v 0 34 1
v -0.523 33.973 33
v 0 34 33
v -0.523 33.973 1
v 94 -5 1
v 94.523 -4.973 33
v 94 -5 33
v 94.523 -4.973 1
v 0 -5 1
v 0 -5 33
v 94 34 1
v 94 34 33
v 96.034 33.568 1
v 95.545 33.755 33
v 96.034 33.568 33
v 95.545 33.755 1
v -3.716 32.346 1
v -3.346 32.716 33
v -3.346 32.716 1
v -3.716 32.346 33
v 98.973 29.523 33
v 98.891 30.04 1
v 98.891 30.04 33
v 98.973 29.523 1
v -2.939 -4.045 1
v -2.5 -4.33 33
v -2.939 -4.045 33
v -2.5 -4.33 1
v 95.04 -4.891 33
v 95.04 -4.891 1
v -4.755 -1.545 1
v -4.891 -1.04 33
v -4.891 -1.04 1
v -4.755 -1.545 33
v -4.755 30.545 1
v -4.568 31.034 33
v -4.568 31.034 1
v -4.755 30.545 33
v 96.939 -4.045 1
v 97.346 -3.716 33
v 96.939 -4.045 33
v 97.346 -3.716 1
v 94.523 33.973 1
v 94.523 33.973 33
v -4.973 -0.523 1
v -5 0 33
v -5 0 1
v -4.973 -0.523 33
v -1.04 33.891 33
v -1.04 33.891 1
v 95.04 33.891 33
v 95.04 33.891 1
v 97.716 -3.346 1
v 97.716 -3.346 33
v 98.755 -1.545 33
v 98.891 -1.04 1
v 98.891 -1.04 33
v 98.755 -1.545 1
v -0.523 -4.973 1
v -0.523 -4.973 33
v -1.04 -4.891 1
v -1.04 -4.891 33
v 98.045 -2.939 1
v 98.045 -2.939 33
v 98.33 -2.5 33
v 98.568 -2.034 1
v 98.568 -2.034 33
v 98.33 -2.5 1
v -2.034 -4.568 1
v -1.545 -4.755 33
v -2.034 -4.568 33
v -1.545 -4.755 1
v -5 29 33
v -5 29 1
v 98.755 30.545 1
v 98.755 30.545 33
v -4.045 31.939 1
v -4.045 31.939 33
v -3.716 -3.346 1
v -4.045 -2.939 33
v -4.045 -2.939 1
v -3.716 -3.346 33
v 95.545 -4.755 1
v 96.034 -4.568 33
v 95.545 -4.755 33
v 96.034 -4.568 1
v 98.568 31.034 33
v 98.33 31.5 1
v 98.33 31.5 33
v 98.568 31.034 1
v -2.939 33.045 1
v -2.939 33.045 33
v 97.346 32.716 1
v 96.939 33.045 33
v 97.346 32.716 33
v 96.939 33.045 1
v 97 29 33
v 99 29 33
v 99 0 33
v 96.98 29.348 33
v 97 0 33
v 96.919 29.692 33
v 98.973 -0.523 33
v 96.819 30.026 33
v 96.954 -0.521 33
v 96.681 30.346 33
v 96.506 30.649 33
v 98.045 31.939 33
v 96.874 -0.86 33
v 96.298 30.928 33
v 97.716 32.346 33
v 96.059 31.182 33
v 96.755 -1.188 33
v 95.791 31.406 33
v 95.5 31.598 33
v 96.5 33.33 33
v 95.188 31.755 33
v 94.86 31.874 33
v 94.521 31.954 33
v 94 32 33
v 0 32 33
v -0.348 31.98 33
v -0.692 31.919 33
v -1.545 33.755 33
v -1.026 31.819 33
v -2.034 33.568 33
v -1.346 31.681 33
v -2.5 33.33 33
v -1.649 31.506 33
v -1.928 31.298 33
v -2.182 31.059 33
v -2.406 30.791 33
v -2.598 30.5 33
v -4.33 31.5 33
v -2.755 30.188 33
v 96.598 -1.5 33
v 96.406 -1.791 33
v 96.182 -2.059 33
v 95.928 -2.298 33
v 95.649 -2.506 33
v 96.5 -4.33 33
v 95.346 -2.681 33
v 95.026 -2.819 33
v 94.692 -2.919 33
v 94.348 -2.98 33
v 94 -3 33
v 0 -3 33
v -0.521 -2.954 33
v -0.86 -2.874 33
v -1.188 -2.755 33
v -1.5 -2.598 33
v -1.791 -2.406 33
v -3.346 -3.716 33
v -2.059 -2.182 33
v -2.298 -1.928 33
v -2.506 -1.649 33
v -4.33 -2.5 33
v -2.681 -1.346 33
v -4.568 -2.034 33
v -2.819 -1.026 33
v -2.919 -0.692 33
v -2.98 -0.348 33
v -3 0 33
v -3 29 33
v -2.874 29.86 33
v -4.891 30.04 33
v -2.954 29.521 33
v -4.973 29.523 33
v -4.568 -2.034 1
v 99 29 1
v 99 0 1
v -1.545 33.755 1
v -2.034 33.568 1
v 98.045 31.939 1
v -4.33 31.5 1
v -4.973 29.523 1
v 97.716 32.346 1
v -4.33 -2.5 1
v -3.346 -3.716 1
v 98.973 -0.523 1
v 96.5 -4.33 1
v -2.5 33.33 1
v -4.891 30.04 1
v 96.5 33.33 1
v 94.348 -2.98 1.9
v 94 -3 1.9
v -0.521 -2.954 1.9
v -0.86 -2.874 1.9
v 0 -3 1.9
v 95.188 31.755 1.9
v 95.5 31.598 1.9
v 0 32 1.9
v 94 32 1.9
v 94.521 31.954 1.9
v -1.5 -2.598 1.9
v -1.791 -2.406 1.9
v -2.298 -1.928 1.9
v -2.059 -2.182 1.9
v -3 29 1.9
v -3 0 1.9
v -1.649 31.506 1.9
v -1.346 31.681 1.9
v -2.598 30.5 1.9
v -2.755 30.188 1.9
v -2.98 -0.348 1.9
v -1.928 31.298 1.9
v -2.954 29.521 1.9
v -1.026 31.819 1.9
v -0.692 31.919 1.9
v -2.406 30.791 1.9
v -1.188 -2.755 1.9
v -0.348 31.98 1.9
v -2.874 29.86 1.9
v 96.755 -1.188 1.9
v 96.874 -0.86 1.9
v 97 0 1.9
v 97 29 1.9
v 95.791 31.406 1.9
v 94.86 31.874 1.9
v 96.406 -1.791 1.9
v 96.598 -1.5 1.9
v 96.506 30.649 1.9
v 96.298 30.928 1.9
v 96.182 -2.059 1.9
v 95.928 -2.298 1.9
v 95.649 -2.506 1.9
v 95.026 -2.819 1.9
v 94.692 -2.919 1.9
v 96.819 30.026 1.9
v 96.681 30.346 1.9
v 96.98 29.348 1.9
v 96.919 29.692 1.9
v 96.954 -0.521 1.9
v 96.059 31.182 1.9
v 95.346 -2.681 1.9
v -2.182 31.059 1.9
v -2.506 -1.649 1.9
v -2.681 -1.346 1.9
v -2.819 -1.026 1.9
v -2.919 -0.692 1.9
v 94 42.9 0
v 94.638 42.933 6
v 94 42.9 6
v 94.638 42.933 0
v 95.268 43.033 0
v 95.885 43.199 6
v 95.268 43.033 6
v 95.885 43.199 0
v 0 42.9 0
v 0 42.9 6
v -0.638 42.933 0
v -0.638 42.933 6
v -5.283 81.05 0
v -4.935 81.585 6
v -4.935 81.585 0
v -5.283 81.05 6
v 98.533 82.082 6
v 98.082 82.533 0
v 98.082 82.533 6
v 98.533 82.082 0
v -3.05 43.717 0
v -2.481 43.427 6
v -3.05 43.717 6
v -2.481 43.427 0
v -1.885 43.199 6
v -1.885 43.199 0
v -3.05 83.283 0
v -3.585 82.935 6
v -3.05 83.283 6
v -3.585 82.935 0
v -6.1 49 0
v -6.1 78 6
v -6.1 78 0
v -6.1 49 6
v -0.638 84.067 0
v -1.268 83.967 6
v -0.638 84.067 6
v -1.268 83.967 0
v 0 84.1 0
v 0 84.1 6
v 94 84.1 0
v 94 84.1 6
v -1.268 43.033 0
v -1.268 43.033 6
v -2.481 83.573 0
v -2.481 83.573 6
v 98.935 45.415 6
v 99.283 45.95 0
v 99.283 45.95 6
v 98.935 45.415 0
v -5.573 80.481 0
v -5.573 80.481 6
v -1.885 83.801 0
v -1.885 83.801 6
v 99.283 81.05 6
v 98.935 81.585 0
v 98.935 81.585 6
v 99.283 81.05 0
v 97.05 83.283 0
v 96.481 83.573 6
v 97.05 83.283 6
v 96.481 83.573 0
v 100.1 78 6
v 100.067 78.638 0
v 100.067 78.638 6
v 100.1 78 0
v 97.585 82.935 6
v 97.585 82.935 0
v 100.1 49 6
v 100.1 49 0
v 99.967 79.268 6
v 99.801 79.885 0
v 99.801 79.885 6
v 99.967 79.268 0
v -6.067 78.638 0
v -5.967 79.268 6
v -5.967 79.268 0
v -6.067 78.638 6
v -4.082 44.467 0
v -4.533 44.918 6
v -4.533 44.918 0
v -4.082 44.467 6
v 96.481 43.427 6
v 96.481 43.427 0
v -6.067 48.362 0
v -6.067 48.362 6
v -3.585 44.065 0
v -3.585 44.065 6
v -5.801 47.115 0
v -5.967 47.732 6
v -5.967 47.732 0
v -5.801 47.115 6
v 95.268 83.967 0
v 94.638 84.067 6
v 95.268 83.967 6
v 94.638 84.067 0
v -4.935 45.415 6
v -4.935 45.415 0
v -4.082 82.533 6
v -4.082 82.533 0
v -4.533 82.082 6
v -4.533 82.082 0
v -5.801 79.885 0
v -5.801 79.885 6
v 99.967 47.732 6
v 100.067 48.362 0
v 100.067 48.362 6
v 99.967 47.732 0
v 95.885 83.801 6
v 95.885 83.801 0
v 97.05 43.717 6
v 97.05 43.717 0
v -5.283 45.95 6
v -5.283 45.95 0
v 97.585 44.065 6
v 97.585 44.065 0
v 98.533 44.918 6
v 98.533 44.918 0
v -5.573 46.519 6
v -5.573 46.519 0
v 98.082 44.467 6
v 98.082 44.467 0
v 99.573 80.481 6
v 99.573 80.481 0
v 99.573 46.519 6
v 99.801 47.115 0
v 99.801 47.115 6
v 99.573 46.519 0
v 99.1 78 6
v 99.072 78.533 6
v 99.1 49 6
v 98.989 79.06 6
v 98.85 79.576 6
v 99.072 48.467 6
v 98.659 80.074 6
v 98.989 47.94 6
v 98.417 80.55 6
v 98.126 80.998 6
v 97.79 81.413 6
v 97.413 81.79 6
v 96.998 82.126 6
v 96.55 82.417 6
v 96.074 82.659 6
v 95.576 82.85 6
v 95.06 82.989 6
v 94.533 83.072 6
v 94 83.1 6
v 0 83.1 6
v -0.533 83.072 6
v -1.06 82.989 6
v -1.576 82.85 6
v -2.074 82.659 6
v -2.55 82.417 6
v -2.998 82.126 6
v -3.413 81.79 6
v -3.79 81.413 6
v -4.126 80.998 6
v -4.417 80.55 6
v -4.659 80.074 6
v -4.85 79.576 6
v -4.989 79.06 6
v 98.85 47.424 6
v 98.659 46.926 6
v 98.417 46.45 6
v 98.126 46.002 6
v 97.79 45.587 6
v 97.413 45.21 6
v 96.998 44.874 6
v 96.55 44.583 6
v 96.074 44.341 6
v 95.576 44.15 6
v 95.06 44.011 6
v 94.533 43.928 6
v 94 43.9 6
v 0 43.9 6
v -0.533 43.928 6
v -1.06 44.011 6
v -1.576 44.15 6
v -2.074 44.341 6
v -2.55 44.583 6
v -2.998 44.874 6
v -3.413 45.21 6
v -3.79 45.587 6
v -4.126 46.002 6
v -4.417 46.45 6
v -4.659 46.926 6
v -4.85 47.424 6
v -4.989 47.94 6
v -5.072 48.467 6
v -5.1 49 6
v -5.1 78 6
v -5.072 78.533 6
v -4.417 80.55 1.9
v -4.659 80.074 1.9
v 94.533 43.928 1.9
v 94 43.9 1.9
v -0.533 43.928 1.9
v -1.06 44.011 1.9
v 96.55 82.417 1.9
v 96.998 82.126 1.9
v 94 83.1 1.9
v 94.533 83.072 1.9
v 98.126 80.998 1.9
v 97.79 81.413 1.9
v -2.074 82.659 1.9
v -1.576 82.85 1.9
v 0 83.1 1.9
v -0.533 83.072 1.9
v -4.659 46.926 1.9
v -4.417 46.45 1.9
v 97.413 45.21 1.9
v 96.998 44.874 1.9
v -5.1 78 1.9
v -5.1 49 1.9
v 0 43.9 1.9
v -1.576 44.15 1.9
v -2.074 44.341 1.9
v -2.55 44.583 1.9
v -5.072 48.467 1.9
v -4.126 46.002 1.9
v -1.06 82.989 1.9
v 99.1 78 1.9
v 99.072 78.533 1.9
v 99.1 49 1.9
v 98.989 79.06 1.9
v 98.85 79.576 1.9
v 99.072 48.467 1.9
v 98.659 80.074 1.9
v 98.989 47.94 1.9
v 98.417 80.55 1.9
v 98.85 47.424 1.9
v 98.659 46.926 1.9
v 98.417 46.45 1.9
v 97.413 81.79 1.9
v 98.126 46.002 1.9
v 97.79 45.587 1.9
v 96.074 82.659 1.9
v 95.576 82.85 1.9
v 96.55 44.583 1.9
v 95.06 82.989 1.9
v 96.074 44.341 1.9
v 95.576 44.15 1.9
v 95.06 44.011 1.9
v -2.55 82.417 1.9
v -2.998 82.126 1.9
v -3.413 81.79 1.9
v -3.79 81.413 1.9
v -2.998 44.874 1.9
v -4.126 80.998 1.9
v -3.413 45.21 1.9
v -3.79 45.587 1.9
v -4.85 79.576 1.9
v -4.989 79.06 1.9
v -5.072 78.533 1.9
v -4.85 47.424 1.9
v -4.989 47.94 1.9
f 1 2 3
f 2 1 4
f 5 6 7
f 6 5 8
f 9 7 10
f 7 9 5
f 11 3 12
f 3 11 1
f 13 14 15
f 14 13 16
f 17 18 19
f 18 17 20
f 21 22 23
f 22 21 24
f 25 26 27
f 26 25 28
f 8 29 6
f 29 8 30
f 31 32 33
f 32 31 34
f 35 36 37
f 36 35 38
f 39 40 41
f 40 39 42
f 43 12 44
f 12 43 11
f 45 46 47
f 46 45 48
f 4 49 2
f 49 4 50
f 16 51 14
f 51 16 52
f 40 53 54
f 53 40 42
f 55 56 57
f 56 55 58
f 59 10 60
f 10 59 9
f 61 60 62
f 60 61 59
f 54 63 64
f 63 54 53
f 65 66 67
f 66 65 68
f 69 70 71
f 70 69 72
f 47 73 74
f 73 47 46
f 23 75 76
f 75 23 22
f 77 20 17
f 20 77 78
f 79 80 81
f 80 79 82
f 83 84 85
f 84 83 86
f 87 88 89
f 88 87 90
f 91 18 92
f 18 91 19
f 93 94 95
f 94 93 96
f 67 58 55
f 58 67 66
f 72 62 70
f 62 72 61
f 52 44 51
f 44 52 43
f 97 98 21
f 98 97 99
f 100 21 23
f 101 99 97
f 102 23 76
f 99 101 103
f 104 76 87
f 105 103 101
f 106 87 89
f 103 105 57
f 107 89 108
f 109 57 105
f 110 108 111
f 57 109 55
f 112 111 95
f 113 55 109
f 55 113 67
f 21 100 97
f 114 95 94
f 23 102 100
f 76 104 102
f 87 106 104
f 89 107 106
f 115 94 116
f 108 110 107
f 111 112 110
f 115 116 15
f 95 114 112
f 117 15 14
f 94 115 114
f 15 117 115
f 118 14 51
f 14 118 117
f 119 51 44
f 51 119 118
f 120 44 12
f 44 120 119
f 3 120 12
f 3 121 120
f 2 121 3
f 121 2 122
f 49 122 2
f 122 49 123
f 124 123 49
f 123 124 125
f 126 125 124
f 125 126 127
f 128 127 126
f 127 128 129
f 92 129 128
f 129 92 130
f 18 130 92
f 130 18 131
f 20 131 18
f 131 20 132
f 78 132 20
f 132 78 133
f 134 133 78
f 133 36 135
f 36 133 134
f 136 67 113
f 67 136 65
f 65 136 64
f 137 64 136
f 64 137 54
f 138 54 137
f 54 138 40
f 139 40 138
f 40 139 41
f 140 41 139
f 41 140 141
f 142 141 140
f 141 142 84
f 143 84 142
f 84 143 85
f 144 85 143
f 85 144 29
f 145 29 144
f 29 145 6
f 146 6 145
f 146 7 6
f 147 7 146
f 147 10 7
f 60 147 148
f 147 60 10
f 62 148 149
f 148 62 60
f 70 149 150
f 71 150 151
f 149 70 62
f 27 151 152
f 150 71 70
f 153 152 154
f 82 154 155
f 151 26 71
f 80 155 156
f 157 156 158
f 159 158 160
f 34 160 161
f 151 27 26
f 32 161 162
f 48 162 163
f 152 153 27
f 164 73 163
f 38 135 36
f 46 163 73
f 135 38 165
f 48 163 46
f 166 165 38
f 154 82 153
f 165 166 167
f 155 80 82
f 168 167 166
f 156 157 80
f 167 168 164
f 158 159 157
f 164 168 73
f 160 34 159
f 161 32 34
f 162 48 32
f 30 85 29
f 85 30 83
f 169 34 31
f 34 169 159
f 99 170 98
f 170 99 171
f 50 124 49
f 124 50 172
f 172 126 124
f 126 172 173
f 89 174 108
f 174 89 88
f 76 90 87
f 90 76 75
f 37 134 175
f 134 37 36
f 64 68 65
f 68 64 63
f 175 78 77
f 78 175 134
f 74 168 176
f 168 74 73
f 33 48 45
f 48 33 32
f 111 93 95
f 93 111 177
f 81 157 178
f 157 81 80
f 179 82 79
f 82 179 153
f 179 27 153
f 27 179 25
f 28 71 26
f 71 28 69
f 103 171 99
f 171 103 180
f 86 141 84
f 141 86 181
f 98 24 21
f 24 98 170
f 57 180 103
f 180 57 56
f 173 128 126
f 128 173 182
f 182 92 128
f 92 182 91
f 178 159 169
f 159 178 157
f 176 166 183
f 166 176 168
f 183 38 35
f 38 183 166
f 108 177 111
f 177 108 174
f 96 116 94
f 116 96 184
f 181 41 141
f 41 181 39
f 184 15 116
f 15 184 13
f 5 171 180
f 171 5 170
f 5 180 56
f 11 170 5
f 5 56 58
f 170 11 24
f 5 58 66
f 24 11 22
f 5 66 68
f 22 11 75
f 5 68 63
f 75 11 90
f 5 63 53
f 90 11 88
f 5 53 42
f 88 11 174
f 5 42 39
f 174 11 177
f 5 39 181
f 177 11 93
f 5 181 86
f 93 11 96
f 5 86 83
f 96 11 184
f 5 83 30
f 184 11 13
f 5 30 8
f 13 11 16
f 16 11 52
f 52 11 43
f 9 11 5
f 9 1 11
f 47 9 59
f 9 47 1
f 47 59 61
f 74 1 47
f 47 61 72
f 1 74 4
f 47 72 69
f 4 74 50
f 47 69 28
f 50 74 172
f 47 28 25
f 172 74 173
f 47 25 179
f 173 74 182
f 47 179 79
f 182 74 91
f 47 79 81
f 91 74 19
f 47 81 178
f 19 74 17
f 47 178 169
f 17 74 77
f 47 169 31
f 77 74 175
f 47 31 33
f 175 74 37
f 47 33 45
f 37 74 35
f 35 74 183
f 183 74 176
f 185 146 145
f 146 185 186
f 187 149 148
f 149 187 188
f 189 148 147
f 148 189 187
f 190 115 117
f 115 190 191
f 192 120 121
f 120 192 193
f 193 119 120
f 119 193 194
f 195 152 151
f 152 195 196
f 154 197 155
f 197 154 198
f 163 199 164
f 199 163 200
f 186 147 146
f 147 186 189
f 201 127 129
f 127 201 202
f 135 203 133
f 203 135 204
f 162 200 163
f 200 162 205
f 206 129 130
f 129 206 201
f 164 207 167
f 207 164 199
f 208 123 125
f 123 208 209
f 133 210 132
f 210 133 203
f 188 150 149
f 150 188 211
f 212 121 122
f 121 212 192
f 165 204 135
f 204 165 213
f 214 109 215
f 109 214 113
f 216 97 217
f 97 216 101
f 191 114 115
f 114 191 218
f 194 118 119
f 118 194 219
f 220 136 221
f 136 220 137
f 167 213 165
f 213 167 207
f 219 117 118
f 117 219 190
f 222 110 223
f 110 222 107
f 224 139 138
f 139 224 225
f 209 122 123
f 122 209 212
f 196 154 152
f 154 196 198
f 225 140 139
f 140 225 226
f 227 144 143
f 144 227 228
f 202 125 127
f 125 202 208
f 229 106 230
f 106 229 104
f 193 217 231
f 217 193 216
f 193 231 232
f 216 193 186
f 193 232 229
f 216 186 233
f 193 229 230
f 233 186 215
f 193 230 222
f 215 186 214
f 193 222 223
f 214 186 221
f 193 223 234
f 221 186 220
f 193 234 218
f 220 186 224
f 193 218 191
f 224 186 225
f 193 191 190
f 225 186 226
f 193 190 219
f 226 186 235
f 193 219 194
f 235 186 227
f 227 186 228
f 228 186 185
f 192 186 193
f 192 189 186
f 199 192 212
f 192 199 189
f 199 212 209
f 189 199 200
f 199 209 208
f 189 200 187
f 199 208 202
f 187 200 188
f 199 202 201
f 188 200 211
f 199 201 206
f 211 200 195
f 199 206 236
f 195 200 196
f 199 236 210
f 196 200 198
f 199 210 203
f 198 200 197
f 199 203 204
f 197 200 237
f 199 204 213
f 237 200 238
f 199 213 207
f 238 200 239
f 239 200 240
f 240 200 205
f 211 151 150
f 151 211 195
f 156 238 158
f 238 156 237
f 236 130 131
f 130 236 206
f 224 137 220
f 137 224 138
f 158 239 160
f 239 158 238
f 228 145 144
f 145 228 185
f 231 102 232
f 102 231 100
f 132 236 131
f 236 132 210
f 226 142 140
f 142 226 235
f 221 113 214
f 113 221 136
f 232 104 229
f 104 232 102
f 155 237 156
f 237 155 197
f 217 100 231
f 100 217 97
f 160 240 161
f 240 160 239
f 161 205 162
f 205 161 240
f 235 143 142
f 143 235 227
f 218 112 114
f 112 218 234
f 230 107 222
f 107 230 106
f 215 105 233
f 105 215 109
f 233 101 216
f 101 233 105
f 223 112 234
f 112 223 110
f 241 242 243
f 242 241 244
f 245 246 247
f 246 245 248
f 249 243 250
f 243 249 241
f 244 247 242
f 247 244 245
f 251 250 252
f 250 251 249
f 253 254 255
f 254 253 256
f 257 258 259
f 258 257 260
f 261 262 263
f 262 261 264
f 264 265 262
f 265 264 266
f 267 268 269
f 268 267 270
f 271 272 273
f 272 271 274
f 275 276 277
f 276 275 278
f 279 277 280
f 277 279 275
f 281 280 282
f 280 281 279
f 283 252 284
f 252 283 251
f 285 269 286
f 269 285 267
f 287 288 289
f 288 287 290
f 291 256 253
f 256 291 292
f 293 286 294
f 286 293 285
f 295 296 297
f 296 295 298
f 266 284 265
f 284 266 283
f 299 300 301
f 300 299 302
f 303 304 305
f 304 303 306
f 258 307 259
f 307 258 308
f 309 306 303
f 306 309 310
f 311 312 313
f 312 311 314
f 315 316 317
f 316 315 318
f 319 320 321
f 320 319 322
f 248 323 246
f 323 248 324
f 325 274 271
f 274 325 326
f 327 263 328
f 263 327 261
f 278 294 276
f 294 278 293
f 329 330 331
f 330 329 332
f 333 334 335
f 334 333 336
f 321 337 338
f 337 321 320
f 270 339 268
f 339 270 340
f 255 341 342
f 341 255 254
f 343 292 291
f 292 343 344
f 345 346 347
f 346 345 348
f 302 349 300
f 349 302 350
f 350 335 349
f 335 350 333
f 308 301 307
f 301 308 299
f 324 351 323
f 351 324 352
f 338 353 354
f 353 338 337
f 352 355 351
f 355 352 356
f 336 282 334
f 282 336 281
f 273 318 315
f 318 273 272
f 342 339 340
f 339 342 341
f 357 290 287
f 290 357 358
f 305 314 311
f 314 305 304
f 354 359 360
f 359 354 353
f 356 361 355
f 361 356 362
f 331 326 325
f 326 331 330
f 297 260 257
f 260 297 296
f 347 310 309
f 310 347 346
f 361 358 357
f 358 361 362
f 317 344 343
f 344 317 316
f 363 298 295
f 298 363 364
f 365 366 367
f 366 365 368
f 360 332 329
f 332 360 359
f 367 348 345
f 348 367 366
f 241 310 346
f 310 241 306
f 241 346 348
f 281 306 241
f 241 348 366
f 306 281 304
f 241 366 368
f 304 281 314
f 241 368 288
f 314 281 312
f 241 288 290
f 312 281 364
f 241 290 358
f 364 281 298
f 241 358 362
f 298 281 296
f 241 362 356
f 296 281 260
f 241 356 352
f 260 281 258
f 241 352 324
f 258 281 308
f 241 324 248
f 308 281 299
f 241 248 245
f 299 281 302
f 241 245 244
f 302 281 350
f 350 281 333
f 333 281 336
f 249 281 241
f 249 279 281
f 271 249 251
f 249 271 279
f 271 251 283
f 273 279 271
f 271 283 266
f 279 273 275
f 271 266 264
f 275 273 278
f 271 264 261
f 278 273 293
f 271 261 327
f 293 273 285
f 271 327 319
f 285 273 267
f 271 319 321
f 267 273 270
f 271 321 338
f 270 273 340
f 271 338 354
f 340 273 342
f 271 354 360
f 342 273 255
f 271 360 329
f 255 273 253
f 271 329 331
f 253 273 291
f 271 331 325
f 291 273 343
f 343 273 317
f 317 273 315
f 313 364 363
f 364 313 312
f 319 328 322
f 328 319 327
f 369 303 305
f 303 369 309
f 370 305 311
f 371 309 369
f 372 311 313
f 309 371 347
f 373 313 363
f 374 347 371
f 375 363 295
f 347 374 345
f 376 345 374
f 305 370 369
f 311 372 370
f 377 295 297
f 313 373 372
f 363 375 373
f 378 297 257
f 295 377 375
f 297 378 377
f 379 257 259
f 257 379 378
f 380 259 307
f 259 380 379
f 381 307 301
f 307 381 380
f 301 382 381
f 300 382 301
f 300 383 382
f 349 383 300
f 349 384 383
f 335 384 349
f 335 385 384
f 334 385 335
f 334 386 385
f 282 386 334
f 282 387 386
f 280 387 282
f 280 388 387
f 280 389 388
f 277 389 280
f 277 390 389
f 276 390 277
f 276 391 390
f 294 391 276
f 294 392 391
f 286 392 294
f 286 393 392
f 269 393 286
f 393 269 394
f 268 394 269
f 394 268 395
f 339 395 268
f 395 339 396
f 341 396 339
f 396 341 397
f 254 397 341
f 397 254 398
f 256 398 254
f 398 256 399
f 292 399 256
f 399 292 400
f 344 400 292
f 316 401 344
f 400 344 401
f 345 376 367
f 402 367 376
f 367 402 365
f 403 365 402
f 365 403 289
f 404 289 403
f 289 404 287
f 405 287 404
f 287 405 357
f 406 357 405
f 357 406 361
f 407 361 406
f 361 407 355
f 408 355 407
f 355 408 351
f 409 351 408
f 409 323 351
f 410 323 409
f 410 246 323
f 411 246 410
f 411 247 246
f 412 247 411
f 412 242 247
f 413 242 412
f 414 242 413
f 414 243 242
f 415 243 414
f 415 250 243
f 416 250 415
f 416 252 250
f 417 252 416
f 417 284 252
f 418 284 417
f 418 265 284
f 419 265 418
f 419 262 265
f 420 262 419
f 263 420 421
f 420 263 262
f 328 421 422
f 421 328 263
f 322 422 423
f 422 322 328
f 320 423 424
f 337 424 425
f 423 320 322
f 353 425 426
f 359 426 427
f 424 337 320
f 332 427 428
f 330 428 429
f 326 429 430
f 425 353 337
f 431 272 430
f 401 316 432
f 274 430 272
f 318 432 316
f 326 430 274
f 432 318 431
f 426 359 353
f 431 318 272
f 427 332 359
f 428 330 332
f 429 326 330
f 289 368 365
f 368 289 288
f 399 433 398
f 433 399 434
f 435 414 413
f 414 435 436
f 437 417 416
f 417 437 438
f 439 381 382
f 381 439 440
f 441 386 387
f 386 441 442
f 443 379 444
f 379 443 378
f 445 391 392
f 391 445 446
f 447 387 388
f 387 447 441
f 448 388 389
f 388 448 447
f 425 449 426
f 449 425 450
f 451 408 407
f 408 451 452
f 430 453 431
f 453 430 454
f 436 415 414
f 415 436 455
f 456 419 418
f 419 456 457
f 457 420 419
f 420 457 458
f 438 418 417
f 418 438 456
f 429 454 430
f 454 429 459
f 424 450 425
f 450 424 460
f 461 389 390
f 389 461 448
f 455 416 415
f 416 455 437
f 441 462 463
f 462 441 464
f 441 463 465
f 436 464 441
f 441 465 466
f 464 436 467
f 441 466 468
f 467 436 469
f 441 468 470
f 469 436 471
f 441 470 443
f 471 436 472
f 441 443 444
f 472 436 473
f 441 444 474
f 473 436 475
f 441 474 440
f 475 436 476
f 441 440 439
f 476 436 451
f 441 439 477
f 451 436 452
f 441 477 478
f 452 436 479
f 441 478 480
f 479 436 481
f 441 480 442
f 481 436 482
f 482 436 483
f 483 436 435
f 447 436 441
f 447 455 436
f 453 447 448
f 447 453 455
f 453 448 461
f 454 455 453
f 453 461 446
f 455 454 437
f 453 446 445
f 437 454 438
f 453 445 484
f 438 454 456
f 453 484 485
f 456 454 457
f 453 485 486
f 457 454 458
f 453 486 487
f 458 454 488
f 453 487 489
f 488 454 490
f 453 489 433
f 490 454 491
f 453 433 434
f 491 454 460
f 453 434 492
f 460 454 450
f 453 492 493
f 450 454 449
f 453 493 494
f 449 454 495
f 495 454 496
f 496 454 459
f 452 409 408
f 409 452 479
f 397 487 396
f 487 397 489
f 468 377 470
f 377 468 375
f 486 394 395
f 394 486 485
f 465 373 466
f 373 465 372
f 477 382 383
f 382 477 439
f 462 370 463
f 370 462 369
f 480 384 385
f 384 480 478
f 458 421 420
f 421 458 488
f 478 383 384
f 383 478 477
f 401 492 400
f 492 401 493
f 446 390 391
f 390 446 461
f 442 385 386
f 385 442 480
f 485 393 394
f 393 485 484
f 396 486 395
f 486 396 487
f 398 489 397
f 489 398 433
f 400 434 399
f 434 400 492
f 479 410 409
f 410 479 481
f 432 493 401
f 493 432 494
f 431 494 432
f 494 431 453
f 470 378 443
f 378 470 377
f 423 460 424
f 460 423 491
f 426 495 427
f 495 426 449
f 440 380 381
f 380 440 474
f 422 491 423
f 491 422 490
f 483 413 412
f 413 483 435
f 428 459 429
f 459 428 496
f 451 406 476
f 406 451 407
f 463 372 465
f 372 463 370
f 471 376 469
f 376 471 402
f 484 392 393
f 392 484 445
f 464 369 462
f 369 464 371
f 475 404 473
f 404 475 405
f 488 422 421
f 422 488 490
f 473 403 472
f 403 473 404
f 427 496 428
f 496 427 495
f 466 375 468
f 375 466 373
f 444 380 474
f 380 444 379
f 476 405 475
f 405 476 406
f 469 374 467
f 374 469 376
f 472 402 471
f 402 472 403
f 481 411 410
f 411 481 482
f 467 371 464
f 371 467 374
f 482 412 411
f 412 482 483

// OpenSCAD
// =============================================
// 3D: Mic Transceiver Box — inner 100x35x17, base + cap
// Version: 1.0
// Author: ChatGPT (OpenSCAD)
// =============================================

// ----------------------------
// Настройка точности
// ----------------------------
$fn = 0;        // фиксированную сегментацию отключаем
$fa = 6;        // 5–8° обычно достаточно
$fs = 0.35;     // ≈ диаметр сопла (0.3–0.5 для сопла 0.4)
pin_fs = 0.25;  // чуть тоньше для штырей и отверстий

// ----------------------------
// Тестовые фрагменты (стандартный блок)
// ----------------------------
test_fragment = false;   // true — печатать только угловые фрагменты (base+cap)
frag_size     = 20;      // размер квадрата вырезки, мм
frag_index    = 0;       // 0=НЛ, 1=ВЛ, 2=НП, 3=ВП (относительно основания)
frag_gap_x    = 10;      // зазор между фрагментами по X, мм
frag_h_extra  = 20;      // запас по высоте клипа, мм

// ----------------------------
// Фаски/скругления по краям (совместимость)
// ----------------------------
tiny = 0.1;                  // небольшой зазор для булевых операций
edge_chamfer_z = 1;          // высота фаски по Z (мм)
edge_chamfer_x = 0.8;        // горизонтальный вылет фаски по X (каждая сторона), мм
edge_chamfer_y = 0.8;        // горизонтальный вылет фаски по Y (каждая сторона), мм
screen_frame_gap = 0.2;      // совместимость

// ----------------------------
// Параметры модели (мм)
// ----------------------------
inner_x = 100;               // внутренняя длина (X)
inner_y = 35;                // внутренняя ширина (Y)
inner_h = 31;                // внутренняя высота (Z)

wall_th    = 2;            // толщина стенок основания
bottom_th  = 2;            // толщина дна основания
corner_r   = 3.0;            // радиус скругления внутренних углов

// Крышка (накладная)
fit_clearance = 0.1;        // зазор на посадку (каждая сторона по радиусу/по XY)
cap_wall_th   = 1;         // толщина стенок крышки
cap_top_th    = 2;         // толщина верха крышки
cap_lip_h     = 5.0;        // глубина посадочного борта крышки (внутрь)

// Выбор вывода
print_base = true;
print_cap  = true;

// ----------------------------
// Вычисляемые размеры
// ----------------------------
base_outer_x = inner_x + 2*wall_th;
base_outer_y = inner_y + 2*wall_th;
base_outer_h = bottom_th + inner_h;

base_inner_r = max(corner_r, 0);
base_outer_r = base_inner_r + wall_th;

cap_inner_x = base_outer_x + 2*fit_clearance;
cap_inner_y = base_outer_y + 2*fit_clearance;
cap_inner_r = base_outer_r + fit_clearance;  // радиус по внутреннему борту крышки

cap_outer_x = cap_inner_x + 2*cap_wall_th;
cap_outer_y = cap_inner_y + 2*cap_wall_th;
cap_outer_r = cap_inner_r + cap_wall_th;

cap_h = cap_top_th + cap_lip_h;

// ----------------------------
// Комментарии / фрагменты
// ----------------------------
// Фрагменты:
// - base: основание — лоток с закругленными углами и плоским дном
// - cap: крышка — закрытый верх + борт нужной глубины, посадка по fit_clearance
// - clip_for_fragments: при test_fragment=true выводит по одному угловому фрагменту base и cap

// ----------------------------
// Вспомогательные функции/модули
// ----------------------------
function clamp(val, lo, hi) = max(lo, min(val, hi));
function clamp_chz(t, chz) = clamp(chz, 0, t/2);
function clamp_chxy(l,w,chx,chy) = [clamp(chx, 0, l/2 - tiny), clamp(chy, 0, w/2 - tiny)];

// 2D скруглённый прямоугольник внешнего размера size=[x,y]
module rr2d(size=[10,10], r=2){
    sx = size[0]; sy = size[1];
    offset(r=r)
        square([max(sx-2*r, tiny), max(sy-2*r, tiny)], center=false);
}

module rr2d_centered(size=[10,10], r=2){
    sx = size[0]; sy = size[1];
    translate([-sx/2, -sy/2]) rr2d(size, r);
}

// Экструзия скруглённого прямоугольника с фаской снизу (симметрия по X/Y)
module chamfered_rr_bottom_edges_sym(size=[10,10], r=2, h=5, chz=0.8, chx=0.8, chy=0.8){
    sx = size[0]; sy = size[1];
    chz2 = clamp_chz(h, chz);
    chxy = clamp_chxy(sx, sy, chx, chy);
    chx2 = chxy[0];
    chy2 = chxy[1];

    if (chz2 <= 0 || (chx2 <= 0 && chy2 <= 0)) {
        linear_extrude(height=h) rr2d([sx, sy], r);
    } else {
        union(){
            // верхнее тело
            translate([0,0,chz2])
                linear_extrude(height=h - chz2)
                    rr2d([sx, sy], r);
            // нижняя фаска (аппрокс. масштабом из центра)
            //r2 = max(r - min(chx2, chy2), tiny);
            //translate([sx/2, sy/2, 0])
            //    linear_extrude(height=chz2, scale=[sx/max(sx - 2*chx2, tiny), sy/max(sy - 2*chy2, tiny)])
            //        rr2d_centered([max(sx - 2*chx2, tiny), max(sy - 2*chy2, tiny)], r2);
        }
    }
}

// ----------------------------
// Фрагменты детали
// ----------------------------
module base_body(){
    difference(){
        // внешний корпус основания с фаской снизу
        chamfered_rr_bottom_edges_sym([base_outer_x, base_outer_y], base_outer_r, base_outer_h, edge_chamfer_z, edge_chamfer_x, edge_chamfer_y);
        // внутренняя полость
        translate([0,0,bottom_th - tiny])
            linear_extrude(height=inner_h + 2*tiny)
                rr2d([inner_x, inner_y], base_inner_r);
    }
}

module cap_shell(){
    difference(){
        // внешний объём крышки (без фаски сверху; опционально фаску снизу)
        chamfered_rr_bottom_edges_sym([cap_outer_x, cap_outer_y], cap_outer_r, cap_h, edge_chamfer_z, edge_chamfer_x, edge_chamfer_y);
        // внутренняя полость на глубину борта
        translate([0,0,0])
            linear_extrude(height=cap_lip_h + tiny)
                rr2d([cap_inner_x, cap_inner_y], cap_inner_r);
    }
}

// Главные детали
module base(){ base_body(); }
module cap(){ cap_shell(); }
module cap_upside_down(){
    translate([0, 0, cap_h])
        mirror([0, 0, 1])
            cap_shell();
}

// ---------------
// Клиппер фрагментов
// ---------------
function corner_offset(ix, L, W, s) =
    (ix == 0) ? [0, 0] :
    (ix == 1) ? [0, max(W - s, 0)] :
    (ix == 2) ? [max(L - s, 0), 0] :
                [max(L - s, 0), max(W - s, 0)];

module clip_for_fragments(){
    if(test_fragment){
        // Фрагмент основания
        intersection(){
            children(0);
            ofs = corner_offset(frag_index, base_outer_x, base_outer_y, frag_size);
            translate([ofs[0], ofs[1], -frag_h_extra])
                cube([frag_size, frag_size, base_outer_h + 2*frag_h_extra], center=false);
        }
        // Фрагмент крышки — справа
        translate([base_outer_x + frag_gap_x + frag_size, 0, 0])
            intersection(){
                children(1);
                ofs2 = corner_offset(frag_index, cap_outer_x, cap_outer_y, frag_size);
                translate([ofs2[0], ofs2[1], -frag_h_extra])
                    cube([frag_size, frag_size, cap_h + 2*frag_h_extra], center=false);
            }
    }else{
        // Полные детали
        children();
    }
}

// ----------------------------
// ВЫВОД МОДЕЛИ
// ----------------------------
if(test_fragment){
    clip_for_fragments(){ base(); }{ cap(); }
}else{
    if (print_base) base();
    if (print_cap) {
        // translate([0, base_outer_y + 10, 0]) cap();
        // translate([cap_outer_x + 10, base_outer_y + 10, 0]) cap_upside_down();
        translate([0, base_outer_y + 10, 0]) cap_upside_down();
    }
}
